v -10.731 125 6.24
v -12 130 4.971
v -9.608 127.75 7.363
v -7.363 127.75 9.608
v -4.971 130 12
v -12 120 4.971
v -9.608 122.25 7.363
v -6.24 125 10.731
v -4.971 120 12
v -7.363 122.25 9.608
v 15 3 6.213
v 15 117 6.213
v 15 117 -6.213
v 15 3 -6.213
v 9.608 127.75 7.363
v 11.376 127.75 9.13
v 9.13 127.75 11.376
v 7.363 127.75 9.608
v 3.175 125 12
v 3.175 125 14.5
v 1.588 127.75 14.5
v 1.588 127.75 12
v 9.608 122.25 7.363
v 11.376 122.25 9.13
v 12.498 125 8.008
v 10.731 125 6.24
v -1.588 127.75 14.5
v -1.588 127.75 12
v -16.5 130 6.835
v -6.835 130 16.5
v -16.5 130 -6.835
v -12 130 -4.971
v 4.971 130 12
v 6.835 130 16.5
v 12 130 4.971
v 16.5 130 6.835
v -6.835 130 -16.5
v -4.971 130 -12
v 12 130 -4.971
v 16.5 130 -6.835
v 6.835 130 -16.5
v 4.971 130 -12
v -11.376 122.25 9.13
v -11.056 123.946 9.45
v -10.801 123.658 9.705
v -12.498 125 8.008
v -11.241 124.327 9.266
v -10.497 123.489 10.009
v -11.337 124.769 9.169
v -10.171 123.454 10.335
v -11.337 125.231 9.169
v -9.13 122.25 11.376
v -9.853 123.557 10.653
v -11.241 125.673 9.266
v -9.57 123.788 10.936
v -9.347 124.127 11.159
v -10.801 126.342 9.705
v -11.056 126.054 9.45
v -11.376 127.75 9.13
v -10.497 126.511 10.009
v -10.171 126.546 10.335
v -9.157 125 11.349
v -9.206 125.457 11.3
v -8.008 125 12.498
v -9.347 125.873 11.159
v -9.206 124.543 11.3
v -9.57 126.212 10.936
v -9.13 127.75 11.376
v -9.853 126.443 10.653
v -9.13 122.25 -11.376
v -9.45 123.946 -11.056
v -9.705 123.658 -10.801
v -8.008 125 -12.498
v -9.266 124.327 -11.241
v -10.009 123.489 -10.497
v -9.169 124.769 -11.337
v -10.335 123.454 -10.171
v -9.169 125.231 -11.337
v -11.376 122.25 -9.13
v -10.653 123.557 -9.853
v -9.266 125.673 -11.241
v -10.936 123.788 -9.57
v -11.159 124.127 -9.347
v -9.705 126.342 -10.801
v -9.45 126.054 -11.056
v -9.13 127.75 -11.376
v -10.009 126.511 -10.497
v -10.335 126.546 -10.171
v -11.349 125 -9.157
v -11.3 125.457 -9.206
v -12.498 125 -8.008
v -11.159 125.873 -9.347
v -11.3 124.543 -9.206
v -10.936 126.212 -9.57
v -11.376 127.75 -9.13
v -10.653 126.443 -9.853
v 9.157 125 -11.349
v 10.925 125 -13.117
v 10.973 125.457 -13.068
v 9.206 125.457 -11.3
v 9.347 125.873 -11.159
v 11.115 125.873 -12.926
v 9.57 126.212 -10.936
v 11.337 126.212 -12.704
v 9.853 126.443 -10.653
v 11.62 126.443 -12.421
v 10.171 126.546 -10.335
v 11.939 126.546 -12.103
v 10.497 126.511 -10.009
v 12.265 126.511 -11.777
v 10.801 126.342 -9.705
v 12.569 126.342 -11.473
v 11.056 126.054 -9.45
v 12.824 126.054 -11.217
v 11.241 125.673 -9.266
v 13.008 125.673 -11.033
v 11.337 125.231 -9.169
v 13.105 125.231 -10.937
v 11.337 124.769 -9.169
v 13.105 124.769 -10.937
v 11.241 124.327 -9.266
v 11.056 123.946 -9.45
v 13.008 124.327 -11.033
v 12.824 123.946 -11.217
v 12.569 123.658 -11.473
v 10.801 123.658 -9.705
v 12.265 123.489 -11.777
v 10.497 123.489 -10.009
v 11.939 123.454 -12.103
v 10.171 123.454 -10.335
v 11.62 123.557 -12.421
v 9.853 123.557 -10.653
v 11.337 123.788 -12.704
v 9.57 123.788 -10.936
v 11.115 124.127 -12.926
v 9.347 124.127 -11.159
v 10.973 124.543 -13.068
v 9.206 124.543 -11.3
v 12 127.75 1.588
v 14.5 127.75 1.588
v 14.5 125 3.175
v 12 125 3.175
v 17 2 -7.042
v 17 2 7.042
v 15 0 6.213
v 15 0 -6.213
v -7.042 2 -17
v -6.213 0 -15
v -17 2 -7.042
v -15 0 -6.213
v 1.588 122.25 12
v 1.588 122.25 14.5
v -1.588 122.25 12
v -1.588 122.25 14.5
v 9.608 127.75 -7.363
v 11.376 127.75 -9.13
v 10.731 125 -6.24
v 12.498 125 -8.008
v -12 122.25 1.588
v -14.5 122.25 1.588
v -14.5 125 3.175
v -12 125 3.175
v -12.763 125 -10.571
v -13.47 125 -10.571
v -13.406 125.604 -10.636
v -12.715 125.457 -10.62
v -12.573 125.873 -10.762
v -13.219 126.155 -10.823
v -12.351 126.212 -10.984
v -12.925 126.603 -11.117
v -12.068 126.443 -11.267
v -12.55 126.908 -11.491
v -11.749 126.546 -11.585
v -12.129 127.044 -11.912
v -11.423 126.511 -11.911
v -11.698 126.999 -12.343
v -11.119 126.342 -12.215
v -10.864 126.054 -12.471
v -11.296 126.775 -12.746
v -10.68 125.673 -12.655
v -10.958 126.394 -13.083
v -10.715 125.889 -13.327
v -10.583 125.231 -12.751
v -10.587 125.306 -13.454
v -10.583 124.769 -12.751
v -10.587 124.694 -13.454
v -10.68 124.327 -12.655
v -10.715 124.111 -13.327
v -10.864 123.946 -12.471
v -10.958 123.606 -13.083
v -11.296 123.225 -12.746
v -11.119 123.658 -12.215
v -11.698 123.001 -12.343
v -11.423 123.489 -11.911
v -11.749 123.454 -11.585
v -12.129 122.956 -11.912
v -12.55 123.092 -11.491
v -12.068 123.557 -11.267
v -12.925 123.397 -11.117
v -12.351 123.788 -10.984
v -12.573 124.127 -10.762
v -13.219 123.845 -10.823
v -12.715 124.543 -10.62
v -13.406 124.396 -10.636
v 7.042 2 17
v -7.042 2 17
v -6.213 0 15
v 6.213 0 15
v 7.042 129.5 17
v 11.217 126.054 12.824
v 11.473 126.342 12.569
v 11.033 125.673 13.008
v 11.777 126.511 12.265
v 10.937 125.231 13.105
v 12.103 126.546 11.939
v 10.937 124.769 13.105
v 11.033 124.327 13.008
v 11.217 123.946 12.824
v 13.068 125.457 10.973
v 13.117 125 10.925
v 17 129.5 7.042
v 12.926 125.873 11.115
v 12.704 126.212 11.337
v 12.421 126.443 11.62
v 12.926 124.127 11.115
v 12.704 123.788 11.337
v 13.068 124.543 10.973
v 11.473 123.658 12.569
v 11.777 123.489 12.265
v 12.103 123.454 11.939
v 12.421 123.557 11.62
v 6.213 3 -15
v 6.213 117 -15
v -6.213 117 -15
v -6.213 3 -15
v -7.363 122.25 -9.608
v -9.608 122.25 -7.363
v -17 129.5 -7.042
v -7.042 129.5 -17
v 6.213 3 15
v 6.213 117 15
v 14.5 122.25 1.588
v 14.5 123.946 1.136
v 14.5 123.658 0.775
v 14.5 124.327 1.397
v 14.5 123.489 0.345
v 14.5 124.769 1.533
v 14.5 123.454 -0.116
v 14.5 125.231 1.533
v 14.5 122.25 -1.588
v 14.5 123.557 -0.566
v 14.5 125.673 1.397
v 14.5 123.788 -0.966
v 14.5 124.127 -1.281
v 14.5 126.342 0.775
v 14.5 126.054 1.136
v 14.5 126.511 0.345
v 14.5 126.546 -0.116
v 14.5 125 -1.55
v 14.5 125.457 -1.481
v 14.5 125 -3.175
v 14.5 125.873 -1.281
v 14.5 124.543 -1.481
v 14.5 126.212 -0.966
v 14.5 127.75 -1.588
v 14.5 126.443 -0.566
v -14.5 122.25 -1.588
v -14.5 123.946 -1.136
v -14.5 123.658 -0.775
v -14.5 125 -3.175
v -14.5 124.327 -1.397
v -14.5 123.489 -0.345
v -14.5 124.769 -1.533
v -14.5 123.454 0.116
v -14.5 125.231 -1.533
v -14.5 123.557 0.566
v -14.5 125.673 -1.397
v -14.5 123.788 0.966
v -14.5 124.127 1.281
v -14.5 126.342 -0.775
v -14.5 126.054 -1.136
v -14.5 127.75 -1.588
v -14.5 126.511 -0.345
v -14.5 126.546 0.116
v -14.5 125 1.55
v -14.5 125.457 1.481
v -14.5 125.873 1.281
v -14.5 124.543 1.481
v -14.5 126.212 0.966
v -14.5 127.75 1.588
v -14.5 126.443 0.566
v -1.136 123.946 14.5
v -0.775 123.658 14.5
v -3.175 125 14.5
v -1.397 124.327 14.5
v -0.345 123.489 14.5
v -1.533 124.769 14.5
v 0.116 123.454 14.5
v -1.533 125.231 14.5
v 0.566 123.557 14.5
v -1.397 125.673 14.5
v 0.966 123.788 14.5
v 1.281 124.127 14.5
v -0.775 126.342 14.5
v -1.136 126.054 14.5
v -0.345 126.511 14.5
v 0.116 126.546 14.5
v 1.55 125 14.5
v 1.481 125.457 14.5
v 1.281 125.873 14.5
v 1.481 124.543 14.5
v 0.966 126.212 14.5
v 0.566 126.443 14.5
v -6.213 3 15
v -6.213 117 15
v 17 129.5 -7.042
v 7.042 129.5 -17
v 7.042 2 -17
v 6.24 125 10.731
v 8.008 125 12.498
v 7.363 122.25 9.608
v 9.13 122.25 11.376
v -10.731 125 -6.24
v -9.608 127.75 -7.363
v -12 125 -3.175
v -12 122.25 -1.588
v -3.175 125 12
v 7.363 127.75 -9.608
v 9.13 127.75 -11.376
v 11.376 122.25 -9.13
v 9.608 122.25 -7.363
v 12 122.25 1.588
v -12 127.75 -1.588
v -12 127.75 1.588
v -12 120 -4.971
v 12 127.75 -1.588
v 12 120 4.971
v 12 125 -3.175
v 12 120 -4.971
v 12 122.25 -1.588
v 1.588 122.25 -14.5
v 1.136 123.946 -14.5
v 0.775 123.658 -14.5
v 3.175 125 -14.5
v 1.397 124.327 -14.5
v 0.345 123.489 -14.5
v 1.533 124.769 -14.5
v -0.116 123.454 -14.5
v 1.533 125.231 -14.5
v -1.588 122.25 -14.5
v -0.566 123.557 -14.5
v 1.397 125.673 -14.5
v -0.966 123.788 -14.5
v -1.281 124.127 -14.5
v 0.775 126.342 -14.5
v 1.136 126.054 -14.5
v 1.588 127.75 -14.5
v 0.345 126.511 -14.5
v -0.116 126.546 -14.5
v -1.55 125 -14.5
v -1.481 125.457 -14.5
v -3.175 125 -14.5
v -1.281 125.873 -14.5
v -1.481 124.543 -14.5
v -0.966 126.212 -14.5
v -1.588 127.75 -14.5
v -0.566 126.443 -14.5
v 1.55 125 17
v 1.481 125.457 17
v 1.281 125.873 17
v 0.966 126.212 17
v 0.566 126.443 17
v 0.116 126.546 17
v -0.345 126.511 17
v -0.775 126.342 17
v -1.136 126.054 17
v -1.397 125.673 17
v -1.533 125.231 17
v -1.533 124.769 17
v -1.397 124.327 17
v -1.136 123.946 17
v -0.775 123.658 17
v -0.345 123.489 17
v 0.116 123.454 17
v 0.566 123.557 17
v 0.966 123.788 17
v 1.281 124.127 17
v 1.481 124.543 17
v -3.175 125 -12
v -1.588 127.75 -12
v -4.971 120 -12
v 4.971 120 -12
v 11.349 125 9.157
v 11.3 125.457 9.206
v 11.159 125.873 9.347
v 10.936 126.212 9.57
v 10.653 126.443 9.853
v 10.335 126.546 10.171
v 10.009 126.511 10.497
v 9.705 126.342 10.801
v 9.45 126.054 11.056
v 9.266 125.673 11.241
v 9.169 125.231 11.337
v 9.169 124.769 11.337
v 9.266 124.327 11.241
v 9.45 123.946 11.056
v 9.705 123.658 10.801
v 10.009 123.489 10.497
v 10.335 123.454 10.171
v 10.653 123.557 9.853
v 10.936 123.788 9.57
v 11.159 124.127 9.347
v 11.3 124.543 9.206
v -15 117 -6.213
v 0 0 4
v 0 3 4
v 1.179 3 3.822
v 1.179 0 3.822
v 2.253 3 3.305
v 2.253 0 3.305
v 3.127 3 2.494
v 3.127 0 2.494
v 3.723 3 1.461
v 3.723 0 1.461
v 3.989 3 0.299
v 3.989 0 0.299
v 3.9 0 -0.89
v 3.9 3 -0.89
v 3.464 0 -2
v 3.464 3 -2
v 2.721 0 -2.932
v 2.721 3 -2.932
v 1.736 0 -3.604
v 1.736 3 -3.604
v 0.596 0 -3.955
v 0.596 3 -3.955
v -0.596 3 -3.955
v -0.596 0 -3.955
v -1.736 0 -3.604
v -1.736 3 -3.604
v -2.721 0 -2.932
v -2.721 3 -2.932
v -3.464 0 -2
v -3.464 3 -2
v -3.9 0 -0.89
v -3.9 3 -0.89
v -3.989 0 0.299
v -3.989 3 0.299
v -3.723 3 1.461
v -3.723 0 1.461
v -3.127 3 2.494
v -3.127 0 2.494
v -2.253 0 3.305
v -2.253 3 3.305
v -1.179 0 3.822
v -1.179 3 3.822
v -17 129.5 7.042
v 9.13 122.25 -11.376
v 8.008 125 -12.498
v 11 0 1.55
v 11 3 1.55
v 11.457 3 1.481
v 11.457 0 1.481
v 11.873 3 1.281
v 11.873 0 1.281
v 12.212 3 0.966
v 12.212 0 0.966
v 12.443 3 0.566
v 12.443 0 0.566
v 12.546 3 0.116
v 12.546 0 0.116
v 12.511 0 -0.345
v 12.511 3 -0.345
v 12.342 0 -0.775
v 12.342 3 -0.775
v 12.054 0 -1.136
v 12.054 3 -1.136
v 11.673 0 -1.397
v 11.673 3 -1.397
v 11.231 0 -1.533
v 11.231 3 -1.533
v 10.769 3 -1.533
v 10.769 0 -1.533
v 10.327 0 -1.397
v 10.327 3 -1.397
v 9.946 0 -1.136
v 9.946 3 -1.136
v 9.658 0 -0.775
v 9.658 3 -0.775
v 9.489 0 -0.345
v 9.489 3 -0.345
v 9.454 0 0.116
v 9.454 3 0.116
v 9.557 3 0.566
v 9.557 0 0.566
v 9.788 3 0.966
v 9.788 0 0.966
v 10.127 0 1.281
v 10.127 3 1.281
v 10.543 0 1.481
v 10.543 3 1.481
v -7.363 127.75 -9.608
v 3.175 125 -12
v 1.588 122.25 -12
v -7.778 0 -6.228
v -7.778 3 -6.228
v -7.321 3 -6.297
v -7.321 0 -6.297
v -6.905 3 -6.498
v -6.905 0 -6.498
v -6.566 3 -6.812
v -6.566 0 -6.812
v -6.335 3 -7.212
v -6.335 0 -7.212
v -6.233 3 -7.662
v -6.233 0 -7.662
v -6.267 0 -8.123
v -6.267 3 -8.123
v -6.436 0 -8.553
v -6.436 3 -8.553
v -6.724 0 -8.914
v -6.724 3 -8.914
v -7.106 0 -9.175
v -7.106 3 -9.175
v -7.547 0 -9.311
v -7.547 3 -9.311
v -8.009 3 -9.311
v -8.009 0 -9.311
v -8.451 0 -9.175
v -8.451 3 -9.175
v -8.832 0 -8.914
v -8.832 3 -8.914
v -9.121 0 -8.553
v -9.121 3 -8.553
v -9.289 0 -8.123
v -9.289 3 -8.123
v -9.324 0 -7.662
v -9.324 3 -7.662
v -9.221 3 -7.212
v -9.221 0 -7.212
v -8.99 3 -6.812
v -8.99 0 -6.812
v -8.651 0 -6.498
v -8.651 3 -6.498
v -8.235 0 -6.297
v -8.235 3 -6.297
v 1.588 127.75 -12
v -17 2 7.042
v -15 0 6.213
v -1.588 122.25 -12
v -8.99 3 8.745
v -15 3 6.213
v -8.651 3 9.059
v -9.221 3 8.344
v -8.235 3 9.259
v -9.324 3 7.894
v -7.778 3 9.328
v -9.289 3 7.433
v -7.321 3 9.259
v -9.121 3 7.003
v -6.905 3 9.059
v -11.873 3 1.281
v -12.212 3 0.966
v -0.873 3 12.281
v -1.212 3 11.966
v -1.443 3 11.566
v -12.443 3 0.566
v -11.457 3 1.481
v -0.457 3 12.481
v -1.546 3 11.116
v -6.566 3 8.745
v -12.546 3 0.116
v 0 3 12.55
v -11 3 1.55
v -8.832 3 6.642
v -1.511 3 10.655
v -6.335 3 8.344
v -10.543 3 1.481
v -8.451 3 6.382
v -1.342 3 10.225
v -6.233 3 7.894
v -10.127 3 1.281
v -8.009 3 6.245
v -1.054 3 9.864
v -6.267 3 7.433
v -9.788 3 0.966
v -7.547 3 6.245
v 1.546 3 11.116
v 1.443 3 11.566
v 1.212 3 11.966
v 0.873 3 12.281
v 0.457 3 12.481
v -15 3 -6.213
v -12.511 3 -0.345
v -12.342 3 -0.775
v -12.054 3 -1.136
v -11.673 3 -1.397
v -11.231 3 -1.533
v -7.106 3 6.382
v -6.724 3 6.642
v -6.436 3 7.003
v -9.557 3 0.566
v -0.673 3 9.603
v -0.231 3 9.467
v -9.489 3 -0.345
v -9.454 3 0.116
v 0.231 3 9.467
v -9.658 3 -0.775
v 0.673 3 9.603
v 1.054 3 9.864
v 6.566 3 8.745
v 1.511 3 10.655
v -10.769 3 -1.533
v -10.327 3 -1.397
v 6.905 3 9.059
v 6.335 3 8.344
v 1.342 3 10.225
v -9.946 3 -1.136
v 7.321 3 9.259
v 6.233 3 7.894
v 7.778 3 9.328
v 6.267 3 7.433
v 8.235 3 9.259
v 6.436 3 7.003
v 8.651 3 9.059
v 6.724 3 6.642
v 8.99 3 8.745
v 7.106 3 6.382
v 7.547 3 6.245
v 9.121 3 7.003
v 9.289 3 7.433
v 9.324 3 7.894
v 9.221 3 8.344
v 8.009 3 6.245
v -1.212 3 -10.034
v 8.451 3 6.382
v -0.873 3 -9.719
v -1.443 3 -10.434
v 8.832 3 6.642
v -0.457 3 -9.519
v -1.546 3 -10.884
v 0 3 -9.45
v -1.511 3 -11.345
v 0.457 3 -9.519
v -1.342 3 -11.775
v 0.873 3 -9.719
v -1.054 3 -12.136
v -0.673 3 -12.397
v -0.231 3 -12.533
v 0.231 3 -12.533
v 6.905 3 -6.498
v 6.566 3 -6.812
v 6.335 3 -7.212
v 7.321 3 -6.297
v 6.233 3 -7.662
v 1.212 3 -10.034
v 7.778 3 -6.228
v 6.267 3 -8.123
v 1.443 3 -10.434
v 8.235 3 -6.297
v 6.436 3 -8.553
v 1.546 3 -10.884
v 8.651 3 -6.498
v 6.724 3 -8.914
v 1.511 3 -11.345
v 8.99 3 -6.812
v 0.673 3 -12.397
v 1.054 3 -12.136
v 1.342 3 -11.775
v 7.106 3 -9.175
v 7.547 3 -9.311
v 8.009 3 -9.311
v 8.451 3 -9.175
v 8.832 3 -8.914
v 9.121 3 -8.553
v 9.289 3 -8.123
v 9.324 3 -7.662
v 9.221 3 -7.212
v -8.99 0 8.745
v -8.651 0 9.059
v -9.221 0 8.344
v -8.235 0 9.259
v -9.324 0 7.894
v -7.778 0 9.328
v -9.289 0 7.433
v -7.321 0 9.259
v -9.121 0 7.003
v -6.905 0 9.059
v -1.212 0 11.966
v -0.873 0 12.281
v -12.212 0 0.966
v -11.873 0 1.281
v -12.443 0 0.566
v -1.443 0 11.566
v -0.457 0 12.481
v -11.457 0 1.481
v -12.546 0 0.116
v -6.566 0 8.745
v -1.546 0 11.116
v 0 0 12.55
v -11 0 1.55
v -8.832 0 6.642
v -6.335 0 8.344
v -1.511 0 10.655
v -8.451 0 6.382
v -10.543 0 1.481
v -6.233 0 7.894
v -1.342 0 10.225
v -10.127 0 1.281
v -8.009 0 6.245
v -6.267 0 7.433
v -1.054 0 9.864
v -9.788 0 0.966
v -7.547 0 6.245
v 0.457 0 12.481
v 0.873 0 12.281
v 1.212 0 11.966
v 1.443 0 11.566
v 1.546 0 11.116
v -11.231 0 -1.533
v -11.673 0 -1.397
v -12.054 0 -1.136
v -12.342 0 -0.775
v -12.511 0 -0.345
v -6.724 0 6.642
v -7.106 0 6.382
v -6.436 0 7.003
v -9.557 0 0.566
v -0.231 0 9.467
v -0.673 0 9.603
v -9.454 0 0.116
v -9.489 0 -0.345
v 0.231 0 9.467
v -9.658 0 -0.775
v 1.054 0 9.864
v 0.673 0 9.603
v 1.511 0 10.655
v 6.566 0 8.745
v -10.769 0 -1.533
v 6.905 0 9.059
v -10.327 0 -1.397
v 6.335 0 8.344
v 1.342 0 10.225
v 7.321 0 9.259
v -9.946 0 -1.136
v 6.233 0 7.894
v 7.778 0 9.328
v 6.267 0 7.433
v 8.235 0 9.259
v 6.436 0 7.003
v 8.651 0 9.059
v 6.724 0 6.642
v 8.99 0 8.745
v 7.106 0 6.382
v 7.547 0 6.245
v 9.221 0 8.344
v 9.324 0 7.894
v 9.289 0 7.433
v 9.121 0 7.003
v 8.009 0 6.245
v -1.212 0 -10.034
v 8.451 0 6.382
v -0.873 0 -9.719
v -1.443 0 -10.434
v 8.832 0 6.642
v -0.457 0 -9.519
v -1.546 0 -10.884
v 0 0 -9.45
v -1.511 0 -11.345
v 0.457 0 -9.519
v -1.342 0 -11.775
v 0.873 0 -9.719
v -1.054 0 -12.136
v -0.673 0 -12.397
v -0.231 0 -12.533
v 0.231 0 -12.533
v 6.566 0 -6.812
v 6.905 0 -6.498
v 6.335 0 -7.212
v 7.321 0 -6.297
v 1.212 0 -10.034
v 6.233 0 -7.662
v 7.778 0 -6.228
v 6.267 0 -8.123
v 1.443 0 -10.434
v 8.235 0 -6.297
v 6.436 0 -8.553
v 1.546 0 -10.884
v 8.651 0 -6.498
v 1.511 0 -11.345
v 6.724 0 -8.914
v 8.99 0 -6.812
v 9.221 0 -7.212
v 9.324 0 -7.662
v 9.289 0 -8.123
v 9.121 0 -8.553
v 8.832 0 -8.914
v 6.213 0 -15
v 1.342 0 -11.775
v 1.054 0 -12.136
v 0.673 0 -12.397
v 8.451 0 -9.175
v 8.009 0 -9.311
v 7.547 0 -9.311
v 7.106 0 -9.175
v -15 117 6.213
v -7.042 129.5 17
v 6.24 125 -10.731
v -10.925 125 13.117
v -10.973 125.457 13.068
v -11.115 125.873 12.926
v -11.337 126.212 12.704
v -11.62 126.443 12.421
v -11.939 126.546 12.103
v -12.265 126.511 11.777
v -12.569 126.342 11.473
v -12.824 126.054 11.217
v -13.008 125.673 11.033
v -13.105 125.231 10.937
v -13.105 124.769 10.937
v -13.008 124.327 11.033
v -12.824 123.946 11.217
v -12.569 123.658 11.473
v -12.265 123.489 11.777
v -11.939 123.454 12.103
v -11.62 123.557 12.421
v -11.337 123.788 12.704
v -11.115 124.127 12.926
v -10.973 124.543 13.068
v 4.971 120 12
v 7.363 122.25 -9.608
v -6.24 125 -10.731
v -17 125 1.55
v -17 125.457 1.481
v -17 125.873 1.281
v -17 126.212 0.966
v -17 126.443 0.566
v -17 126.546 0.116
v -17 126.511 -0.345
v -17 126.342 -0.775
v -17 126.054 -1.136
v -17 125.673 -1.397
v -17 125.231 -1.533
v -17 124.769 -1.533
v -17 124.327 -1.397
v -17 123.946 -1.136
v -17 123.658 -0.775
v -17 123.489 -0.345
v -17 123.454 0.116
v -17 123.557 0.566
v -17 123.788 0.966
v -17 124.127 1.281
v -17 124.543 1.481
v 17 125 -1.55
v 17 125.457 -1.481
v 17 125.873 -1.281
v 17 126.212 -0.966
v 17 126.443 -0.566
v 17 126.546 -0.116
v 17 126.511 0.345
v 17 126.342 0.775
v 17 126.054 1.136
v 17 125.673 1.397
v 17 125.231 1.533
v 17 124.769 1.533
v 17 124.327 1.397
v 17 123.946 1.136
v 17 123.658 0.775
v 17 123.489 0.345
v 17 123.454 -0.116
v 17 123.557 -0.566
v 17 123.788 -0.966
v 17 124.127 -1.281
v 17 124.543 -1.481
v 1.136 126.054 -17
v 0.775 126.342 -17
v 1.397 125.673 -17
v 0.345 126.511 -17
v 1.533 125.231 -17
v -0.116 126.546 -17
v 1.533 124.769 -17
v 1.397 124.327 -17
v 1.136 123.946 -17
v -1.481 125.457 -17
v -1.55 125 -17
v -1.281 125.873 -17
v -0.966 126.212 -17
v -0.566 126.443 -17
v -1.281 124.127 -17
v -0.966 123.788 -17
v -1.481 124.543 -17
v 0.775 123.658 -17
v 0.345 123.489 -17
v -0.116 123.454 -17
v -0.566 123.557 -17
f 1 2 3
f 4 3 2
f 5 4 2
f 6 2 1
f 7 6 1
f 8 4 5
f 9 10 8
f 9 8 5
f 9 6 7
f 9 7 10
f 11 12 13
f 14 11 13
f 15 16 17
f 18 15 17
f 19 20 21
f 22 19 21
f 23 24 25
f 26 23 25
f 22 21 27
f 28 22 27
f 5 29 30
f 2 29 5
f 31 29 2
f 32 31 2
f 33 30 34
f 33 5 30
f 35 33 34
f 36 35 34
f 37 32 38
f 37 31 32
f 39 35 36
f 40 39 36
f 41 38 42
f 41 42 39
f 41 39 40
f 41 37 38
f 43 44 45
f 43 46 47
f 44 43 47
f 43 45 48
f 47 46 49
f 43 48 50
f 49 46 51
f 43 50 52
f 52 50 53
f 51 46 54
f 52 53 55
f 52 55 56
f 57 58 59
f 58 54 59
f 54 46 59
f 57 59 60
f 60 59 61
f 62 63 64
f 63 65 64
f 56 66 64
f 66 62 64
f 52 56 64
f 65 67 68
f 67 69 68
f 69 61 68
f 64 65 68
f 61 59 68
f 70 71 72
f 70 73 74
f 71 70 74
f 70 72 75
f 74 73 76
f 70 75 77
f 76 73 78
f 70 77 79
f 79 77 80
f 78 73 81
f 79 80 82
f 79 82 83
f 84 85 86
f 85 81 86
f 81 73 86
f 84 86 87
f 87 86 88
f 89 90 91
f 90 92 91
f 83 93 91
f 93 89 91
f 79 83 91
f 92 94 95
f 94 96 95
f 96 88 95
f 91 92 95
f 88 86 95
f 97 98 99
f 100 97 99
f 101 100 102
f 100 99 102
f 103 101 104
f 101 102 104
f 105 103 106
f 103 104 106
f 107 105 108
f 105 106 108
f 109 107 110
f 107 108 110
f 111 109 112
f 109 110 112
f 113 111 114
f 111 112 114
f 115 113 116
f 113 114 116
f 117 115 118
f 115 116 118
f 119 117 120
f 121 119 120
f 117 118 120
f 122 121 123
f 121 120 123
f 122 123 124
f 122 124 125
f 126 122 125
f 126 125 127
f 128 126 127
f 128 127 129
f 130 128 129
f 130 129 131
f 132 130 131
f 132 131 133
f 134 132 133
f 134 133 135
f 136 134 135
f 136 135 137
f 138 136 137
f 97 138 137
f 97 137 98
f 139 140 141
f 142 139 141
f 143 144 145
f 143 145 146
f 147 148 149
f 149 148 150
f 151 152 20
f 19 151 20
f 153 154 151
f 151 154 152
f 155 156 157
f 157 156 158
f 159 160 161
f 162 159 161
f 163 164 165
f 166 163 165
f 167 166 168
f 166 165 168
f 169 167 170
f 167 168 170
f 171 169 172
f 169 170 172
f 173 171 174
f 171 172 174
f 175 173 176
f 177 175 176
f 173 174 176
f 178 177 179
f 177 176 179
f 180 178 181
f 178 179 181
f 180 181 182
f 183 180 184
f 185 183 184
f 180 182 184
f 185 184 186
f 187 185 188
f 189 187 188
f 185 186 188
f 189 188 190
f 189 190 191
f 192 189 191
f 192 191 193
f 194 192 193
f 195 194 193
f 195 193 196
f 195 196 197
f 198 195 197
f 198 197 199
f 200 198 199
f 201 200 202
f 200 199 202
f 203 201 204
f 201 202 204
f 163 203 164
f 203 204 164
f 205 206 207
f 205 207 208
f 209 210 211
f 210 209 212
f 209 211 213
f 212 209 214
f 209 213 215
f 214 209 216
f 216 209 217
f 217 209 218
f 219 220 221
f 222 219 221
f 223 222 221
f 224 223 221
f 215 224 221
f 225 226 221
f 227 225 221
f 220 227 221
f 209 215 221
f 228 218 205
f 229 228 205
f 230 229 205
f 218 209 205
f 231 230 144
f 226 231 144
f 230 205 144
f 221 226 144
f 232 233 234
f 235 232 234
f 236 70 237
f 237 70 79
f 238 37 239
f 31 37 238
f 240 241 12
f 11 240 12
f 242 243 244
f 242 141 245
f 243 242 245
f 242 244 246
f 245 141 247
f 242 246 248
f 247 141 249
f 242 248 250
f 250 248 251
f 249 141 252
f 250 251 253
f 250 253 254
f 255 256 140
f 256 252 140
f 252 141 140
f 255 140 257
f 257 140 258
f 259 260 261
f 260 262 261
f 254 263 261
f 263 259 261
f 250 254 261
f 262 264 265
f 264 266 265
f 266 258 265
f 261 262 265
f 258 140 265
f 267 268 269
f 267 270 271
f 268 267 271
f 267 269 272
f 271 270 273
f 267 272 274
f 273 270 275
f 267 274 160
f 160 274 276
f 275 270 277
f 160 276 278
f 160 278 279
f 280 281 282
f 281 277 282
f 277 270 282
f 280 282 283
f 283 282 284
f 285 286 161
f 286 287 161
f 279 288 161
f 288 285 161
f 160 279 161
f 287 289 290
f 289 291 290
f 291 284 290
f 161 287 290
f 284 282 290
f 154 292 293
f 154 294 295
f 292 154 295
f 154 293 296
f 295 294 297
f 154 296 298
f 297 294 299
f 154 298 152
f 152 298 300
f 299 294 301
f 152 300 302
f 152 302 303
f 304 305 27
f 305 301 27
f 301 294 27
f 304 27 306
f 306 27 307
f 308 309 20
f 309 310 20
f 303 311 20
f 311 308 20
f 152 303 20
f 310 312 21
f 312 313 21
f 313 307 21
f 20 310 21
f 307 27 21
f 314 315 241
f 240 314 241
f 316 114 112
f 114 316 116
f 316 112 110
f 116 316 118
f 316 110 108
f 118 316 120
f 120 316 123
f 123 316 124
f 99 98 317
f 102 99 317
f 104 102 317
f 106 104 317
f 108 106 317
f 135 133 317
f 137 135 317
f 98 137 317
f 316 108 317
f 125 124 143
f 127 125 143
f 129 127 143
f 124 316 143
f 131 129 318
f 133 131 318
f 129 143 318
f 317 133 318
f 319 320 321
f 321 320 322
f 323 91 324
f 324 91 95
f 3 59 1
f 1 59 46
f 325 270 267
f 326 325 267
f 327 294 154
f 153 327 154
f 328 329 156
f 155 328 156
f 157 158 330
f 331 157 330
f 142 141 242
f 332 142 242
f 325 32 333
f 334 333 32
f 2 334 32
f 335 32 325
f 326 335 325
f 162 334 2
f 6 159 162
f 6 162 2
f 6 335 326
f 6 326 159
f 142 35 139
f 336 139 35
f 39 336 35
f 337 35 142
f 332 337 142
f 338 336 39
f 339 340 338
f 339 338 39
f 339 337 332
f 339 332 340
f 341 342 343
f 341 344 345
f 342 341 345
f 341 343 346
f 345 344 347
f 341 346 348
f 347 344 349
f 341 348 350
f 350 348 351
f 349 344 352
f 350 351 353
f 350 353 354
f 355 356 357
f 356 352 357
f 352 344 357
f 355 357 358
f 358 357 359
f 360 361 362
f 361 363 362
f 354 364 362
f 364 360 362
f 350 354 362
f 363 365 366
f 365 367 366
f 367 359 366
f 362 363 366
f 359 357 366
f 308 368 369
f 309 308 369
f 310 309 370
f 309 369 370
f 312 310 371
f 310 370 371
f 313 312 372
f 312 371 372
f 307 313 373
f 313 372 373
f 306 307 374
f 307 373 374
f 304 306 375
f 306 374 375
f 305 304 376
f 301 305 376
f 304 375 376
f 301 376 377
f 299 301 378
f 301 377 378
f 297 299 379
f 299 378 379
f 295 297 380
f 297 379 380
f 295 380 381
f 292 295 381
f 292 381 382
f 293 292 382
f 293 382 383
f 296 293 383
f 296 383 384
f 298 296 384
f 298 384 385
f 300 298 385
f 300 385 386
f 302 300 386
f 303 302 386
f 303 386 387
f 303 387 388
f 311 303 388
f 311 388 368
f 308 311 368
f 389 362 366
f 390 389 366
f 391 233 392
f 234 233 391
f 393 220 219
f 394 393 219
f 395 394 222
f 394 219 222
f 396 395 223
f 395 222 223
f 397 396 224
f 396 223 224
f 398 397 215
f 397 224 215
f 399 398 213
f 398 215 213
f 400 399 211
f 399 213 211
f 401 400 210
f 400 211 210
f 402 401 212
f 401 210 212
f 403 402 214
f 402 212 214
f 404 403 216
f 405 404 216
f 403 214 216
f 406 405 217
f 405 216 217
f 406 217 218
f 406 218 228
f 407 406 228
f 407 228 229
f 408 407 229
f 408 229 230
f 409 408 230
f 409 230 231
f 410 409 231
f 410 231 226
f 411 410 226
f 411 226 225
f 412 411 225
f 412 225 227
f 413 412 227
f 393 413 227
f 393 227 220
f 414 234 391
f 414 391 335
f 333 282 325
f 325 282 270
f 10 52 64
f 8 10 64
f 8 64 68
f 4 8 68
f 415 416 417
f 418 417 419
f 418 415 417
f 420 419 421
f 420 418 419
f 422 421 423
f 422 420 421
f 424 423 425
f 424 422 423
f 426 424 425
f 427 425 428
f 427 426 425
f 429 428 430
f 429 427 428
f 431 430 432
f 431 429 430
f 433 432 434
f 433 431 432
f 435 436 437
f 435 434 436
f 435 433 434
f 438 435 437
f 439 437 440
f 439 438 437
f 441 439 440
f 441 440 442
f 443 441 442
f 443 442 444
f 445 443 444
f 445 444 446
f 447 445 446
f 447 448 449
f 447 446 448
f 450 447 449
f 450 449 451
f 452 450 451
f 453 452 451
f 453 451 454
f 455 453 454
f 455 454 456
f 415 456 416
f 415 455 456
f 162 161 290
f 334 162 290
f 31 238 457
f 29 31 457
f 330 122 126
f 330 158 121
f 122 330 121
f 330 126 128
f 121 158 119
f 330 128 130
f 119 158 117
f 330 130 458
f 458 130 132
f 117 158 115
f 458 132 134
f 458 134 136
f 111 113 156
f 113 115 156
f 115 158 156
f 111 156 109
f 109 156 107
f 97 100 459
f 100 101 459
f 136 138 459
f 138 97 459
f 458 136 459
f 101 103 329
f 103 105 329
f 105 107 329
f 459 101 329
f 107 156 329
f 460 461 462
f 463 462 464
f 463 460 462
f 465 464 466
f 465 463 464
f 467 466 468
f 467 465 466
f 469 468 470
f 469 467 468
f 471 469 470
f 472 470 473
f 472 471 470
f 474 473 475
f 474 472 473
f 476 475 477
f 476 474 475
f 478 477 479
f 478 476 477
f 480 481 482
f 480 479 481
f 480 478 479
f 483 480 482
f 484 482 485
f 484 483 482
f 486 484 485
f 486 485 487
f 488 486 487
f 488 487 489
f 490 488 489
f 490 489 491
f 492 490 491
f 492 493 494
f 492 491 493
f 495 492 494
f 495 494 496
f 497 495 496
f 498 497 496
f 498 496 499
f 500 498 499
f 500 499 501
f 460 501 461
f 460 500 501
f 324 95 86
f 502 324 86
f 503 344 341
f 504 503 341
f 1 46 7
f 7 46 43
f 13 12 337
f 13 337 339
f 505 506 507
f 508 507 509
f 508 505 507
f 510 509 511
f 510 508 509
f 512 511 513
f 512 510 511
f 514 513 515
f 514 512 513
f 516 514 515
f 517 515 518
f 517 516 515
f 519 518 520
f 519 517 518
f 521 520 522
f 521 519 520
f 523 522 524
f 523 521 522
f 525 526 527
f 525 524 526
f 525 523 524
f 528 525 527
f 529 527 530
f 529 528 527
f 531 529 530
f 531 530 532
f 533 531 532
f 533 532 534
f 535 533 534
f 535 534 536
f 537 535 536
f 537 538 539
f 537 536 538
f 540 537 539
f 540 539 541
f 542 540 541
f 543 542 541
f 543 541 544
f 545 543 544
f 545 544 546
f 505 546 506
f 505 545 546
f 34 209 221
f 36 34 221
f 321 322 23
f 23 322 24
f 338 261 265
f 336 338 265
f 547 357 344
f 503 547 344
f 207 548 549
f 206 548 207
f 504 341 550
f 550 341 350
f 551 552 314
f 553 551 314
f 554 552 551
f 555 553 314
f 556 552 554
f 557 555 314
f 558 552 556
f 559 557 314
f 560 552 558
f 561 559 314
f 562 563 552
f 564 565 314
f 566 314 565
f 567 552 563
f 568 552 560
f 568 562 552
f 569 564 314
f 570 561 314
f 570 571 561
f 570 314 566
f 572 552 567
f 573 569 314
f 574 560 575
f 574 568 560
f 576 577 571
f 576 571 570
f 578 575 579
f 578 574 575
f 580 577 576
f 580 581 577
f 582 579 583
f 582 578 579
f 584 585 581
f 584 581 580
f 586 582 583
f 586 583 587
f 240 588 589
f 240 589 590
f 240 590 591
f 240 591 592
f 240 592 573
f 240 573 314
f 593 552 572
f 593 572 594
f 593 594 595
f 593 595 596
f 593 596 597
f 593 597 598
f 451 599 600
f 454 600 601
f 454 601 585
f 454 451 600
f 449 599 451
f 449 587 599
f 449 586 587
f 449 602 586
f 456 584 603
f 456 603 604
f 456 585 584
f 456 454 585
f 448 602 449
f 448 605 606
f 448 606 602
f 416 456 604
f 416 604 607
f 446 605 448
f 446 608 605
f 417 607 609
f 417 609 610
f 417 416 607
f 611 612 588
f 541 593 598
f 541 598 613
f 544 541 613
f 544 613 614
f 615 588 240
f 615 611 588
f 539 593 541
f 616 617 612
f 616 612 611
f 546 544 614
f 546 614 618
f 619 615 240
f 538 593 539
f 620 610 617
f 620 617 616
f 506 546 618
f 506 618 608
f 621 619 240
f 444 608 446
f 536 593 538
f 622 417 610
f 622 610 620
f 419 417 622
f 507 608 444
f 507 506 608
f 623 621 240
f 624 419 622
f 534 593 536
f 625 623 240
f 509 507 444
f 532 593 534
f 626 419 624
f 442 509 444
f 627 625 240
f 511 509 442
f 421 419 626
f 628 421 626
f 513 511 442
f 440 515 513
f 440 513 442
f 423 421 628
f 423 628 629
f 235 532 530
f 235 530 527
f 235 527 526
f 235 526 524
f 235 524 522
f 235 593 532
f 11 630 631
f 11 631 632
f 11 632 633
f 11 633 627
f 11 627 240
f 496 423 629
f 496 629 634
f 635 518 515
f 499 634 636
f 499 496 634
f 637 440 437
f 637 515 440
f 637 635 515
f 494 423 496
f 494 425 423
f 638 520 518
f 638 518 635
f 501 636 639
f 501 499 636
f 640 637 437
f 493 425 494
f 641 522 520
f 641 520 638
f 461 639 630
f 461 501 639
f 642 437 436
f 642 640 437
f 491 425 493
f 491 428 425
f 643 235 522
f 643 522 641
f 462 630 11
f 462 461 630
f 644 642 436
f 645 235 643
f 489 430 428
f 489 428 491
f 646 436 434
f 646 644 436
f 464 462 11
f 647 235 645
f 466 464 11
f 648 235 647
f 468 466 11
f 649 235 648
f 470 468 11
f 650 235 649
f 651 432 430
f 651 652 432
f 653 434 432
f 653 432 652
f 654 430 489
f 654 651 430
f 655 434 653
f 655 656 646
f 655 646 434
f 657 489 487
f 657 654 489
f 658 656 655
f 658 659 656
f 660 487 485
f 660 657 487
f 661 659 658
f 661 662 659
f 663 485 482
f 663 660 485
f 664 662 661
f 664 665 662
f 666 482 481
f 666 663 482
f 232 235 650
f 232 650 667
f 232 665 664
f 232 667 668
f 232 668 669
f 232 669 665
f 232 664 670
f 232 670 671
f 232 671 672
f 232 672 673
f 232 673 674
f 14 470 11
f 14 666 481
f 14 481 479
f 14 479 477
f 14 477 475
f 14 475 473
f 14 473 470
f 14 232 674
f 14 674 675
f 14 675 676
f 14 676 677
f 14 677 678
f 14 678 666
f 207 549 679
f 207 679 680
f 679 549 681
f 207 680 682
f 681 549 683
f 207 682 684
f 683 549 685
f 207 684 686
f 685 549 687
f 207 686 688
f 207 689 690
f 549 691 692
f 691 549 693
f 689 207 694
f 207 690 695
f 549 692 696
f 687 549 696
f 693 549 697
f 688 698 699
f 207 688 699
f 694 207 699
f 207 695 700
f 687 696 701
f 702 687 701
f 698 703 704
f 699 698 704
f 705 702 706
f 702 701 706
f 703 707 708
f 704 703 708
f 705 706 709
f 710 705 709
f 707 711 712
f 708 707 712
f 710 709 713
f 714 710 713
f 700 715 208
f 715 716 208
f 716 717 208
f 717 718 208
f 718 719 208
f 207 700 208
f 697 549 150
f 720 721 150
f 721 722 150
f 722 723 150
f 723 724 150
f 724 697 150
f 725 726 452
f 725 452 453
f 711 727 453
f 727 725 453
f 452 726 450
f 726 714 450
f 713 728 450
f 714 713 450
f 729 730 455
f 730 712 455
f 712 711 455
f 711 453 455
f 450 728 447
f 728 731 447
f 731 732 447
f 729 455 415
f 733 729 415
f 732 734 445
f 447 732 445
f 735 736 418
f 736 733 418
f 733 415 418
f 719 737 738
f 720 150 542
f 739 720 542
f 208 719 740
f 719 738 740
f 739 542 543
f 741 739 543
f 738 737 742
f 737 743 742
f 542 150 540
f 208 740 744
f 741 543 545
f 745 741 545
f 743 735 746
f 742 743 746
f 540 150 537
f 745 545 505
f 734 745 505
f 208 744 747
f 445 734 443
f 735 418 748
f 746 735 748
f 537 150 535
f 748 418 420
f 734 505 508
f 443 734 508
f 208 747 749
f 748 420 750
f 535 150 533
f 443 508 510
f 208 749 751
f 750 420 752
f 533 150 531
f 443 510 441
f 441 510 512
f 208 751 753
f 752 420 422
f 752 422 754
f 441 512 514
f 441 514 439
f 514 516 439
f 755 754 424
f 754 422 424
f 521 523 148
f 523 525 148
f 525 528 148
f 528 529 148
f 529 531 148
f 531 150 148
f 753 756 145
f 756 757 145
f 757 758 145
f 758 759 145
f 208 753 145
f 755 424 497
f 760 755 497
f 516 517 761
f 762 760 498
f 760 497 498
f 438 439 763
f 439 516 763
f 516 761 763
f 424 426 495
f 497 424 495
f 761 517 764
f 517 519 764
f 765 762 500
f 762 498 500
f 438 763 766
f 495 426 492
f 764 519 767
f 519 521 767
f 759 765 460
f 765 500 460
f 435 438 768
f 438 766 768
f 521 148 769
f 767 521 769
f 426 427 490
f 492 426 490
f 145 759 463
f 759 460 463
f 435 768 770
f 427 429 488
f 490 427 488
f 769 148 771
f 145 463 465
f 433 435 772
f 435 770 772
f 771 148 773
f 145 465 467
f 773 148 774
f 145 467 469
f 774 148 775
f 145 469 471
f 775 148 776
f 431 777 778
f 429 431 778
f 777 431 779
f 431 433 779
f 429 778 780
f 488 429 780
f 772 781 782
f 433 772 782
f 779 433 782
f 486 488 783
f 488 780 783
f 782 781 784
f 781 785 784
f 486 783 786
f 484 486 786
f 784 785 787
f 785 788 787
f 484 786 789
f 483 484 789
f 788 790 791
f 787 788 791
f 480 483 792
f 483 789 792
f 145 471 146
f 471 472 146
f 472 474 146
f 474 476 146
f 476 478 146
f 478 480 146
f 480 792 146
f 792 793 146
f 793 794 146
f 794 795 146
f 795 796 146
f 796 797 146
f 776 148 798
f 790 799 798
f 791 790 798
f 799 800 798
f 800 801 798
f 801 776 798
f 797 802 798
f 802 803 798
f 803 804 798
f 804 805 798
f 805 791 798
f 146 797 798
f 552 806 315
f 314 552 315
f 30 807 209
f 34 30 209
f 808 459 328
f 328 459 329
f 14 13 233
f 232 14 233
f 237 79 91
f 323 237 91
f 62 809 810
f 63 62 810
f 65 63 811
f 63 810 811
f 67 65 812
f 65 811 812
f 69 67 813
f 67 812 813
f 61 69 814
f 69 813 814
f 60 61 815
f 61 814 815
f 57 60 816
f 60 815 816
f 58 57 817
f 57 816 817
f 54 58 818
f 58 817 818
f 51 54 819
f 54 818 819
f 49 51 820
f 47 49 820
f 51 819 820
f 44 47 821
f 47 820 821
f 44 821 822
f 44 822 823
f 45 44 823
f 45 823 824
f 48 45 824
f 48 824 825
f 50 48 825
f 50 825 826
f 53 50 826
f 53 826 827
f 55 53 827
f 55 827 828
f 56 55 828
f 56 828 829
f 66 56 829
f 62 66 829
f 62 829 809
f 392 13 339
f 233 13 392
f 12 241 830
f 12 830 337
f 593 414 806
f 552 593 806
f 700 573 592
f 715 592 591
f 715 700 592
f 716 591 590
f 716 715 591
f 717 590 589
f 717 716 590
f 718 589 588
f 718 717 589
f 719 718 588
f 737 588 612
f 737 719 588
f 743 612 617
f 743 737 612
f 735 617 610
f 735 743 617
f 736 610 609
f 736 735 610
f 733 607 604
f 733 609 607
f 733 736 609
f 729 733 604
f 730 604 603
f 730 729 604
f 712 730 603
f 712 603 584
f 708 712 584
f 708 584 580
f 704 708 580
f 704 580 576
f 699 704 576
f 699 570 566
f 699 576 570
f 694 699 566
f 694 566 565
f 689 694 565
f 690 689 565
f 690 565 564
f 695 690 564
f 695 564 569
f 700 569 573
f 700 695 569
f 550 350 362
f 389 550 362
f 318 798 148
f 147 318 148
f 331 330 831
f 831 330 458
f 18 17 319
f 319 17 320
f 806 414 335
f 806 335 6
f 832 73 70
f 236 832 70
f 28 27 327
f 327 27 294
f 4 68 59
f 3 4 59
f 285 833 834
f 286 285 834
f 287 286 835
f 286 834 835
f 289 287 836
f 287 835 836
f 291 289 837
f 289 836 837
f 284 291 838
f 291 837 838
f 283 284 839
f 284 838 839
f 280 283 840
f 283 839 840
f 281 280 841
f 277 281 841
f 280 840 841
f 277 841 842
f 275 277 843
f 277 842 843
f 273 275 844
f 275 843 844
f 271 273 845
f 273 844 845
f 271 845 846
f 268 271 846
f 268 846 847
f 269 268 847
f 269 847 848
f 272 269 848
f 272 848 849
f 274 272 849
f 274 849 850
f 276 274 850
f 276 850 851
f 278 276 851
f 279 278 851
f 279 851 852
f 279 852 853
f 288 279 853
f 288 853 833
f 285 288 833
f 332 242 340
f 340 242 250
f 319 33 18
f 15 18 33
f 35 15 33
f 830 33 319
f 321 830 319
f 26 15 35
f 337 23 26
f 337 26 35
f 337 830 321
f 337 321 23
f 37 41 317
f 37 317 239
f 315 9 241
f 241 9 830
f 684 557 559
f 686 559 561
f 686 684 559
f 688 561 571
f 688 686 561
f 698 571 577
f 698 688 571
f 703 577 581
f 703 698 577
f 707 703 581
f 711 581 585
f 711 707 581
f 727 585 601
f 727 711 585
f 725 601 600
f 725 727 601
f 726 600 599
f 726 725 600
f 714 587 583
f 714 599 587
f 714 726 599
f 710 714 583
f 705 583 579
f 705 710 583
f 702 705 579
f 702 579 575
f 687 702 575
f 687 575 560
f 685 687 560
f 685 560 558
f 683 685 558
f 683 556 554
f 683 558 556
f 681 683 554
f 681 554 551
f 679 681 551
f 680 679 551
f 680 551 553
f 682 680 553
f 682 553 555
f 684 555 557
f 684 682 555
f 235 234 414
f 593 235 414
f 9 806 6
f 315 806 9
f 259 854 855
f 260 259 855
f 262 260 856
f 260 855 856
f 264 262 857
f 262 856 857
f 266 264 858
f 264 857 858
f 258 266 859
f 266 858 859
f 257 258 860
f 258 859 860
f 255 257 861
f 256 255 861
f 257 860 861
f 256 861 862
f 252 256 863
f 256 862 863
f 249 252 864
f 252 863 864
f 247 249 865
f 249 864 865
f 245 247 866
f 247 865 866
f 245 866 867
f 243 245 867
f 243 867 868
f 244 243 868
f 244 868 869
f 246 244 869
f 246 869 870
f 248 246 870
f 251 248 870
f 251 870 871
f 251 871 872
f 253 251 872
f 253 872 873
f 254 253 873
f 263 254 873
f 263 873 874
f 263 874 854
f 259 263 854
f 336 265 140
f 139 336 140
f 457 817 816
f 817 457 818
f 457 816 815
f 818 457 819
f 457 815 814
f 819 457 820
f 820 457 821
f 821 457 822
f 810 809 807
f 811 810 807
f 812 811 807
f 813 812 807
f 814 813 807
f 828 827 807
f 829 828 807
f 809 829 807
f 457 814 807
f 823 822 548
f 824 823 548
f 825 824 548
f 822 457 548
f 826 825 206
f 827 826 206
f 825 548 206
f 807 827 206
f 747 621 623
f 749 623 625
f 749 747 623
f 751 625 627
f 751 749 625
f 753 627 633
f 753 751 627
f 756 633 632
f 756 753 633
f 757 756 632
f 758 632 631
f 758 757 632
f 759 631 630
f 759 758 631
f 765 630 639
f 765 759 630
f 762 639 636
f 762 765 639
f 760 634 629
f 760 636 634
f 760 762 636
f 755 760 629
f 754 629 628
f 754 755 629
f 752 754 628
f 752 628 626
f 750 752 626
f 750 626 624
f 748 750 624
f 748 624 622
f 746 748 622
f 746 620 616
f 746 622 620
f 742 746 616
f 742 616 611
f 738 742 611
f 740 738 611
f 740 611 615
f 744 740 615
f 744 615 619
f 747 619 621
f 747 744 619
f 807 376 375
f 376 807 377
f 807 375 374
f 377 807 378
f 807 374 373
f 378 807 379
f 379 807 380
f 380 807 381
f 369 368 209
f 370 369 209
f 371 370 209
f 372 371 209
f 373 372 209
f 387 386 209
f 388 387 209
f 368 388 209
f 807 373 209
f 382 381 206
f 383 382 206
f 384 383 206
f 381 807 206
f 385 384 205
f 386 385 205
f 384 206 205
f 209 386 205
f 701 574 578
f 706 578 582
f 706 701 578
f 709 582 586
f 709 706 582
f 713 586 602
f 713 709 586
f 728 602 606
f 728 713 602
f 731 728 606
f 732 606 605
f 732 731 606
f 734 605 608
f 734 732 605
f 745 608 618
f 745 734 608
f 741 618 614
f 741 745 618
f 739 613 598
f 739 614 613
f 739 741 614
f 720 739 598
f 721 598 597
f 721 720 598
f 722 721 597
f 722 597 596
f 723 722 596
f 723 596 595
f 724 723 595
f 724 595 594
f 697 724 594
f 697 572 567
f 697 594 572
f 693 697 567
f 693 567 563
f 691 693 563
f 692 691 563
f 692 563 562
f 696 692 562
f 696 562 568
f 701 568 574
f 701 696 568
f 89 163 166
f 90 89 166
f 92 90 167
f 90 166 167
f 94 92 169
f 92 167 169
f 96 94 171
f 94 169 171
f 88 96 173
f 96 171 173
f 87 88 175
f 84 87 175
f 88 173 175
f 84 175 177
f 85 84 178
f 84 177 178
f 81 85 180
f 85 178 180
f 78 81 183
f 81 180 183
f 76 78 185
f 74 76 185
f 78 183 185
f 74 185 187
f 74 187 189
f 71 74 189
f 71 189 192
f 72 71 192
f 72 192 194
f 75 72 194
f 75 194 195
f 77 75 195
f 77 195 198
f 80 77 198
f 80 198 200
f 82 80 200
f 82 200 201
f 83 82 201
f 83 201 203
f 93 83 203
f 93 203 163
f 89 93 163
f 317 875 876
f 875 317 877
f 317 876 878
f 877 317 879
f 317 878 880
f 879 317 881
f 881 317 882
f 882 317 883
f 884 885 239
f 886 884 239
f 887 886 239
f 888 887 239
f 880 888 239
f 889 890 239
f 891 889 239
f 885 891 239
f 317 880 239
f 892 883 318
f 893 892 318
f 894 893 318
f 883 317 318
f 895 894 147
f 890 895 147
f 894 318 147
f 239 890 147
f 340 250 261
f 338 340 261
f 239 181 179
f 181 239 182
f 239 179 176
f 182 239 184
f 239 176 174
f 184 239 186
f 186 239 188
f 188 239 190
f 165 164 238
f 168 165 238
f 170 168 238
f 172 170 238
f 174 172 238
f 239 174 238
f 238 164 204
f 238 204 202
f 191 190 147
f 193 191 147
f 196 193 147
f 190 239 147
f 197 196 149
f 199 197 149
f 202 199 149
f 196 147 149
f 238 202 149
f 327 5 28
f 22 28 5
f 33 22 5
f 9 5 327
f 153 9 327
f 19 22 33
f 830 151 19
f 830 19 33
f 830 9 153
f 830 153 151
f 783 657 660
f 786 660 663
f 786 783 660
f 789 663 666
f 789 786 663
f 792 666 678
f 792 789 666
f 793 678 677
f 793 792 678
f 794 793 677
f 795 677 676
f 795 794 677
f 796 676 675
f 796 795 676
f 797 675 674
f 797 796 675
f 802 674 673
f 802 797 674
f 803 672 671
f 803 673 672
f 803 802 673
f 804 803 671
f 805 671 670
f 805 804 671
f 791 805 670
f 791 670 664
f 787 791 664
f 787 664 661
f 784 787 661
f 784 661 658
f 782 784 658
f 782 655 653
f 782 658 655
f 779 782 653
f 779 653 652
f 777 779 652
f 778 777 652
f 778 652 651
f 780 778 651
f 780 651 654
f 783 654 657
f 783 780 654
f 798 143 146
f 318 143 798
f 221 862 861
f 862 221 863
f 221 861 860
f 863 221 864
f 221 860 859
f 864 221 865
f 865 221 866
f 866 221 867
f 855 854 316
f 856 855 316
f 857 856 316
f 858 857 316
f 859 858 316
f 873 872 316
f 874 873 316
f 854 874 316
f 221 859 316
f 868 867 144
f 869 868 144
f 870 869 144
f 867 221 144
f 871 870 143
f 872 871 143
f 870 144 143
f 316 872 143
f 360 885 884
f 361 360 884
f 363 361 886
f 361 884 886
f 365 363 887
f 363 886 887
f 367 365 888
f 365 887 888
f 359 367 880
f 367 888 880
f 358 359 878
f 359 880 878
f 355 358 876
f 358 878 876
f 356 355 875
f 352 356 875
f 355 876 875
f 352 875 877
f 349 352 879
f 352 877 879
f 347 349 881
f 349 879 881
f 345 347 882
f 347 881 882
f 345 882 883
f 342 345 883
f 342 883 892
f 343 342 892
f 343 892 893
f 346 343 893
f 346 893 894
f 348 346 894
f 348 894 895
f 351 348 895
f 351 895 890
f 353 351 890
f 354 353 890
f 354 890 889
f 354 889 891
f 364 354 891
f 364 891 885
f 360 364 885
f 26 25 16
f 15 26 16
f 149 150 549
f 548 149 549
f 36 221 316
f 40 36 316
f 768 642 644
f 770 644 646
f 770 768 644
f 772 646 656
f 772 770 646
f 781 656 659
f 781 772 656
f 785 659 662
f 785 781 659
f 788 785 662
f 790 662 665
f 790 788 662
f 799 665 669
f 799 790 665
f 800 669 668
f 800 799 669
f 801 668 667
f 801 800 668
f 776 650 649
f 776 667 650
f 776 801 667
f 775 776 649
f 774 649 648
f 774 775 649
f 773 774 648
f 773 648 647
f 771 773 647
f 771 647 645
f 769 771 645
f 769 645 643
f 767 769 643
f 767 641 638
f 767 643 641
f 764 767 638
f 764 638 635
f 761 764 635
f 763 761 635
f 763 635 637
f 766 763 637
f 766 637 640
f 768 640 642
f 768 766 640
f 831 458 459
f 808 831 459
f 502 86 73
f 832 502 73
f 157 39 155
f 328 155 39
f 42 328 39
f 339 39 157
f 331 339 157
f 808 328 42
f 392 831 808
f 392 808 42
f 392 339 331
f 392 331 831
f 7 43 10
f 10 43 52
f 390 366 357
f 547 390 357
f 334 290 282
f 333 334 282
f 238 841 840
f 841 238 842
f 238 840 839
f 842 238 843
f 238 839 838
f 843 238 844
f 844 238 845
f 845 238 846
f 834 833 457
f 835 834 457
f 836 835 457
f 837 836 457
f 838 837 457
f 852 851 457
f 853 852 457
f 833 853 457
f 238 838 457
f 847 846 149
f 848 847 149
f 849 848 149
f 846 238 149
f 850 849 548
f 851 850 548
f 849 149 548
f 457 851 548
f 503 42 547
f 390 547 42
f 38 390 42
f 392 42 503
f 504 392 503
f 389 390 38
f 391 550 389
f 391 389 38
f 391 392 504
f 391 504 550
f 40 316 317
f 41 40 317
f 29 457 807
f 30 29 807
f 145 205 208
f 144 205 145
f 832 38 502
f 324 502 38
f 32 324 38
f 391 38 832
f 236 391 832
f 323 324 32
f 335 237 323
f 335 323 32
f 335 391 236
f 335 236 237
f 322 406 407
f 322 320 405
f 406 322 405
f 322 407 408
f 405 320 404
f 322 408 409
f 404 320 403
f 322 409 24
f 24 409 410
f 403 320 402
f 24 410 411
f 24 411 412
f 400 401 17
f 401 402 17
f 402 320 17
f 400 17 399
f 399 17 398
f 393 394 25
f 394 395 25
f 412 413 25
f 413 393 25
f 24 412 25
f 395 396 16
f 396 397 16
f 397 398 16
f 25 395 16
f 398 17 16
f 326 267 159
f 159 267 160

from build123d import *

# Parameters (mm, degrees)
CROQUIS1_R              = 1.55
CROQUIS1_R_2            = 4
SALIENTE_EXTRUIR1_DEPTH = 120
CORTAR_EXTRUIR1_DEPTH   = 117
SALIENTE_EXTRUIR2_DEPTH = 10
CHAFL_N2_SIZE           = 3
CORTAR_EXTRUIR2_REACH   = 138.325
CROQUIS4_R              = 1.55
CHAFL_N3_SIZE           = 0.5
CORTAR_EXTRUIR3_START   = -2.5
CORTAR_EXTRUIR3_DEPTH   = 10
MATRIZC5_COUNT          = 8
CHAFL_N1_SIZE           = 2
CHAFL_N4_SIZE           = 0.5


with BuildPart() as part:
    # Croquis1 → Saliente-Extruir1 (new body)
    with BuildSketch(Plane(origin=(0, 0, 0), x_dir=(1, 0, 0), z_dir=(0, 1, 0))):
        Polygon((17, -7.04163056), (17, 7.04163056), (7.04163056, 17), (-7.04163056, 17), (-17, 7.04163056), (-17, -7.04163056), (-7.04163056, -17), (7.04163056, -17), align=None)
        with Locations(Location((0, 11, 0), (0, 0, 270))):
            Circle(CROQUIS1_R, mode=Mode.SUBTRACT)
        with Locations(Location((0, 0, 0), (0, 0, 270))):
            Circle(CROQUIS1_R_2, mode=Mode.SUBTRACT)
        with Locations(Location((7.778174593, 7.778174593, 0), (0, 0, 270))):
            Circle(CROQUIS1_R, mode=Mode.SUBTRACT)
        with Locations(Location((11, 0, 0), (0, 0, 270))):
            Circle(CROQUIS1_R, mode=Mode.SUBTRACT)
        with Locations(Location((7.778174593, -7.778174593, 0), (0, 0, 270))):
            Circle(CROQUIS1_R, mode=Mode.SUBTRACT)
        with Locations(Location((0, -11, 0), (0, 0, 270))):
            Circle(CROQUIS1_R, mode=Mode.SUBTRACT)
        with Locations(Location((-7.778174593, -7.778174593, 0), (0, 0, 270))):
            Circle(CROQUIS1_R, mode=Mode.SUBTRACT)
        with Locations(Location((-11, 0, 0), (0, 0, 270))):
            Circle(CROQUIS1_R, mode=Mode.SUBTRACT)
        with Locations(Location((-7.778174593, 7.778174593, 0), (0, 0, 270))):
            Circle(CROQUIS1_R, mode=Mode.SUBTRACT)
    extrude(amount=SALIENTE_EXTRUIR1_DEPTH)

    # Croquis2 → Cortar-Extruir1 (cut)
    with BuildSketch(Plane(origin=(0, 120, 0), x_dir=(1, 0, 0), z_dir=(0, 1, 0))):
        Polygon((6.213203436, 15), (-6.213203436, 15), (-15, 6.213203436), (-15, -6.213203436), (-6.213203436, -15), (6.213203436, -15), (15, -6.213203436), (15, 6.213203436), align=None)
    extrude(amount=-CORTAR_EXTRUIR1_DEPTH, mode=Mode.SUBTRACT)

    # Croquis3 → Saliente-Extruir2 (add)
    with BuildSketch(Plane(origin=(0, 120, 0), x_dir=(1, 0, 0), z_dir=(0, 1, 0))):
        Polygon((7.04163056, 17), (-7.04163056, 17), (-17, 7.04163056), (-17, -7.04163056), (-7.04163056, -17), (7.04163056, -17), (17, -7.04163056), (17, 7.04163056), align=None)
        Polygon((12, -4.970562748), (12, 4.970562748), (4.970562748, 12), (-4.970562748, 12), (-12, 4.970562748), (-12, -4.970562748), (-4.970562748, -12), (4.970562748, -12), align=None, mode=Mode.SUBTRACT)
    extrude(amount=SALIENTE_EXTRUIR2_DEPTH)

    # Chaflán2
    chafl_n2_edges = [part.edges().sort_by_distance(p)[0] for p in [
        (10.606601718, 120, -10.606601718),
        (0, 120, -15),
        (-10.606601718, 120, -10.606601718),
        (-15, 120, 0),
        (-10.606601718, 120, 10.606601718),
        (0, 120, 15),
        (10.606601718, 120, 10.606601718),
        (15, 120, 0),
    ]]
    chamfer(chafl_n2_edges, length=CHAFL_N2_SIZE - 0.0001)  # a hair under: the kernel refuses the full size

    # Croquis4 → Cortar-Extruir2 (cut, up to next)
    with BuildSketch(Plane(origin=(-12.02081528, 0, -12.02081528), x_dir=(-0.7071067811865472, 0, 0.7071067811865478), z_dir=(-0.7071067811865478, 0, -0.7071067811865472)), mode=Mode.PRIVATE) as cortar_extruir2_sk1:
        with Locations((0, 125)):
            Circle(CROQUIS4_R)
    cortar_extruir2_tool1 = extrude(cortar_extruir2_sk1.sketch, amount=-CORTAR_EXTRUIR2_REACH, mode=Mode.PRIVATE) & part.part
    cortar_extruir2 = cortar_extruir2_tool1.solids().sort_by_distance((-12.020815, 125, -12.020815))[0]
    add(cortar_extruir2, mode=Mode.SUBTRACT)

    # Chaflán3
    chafl_n3_edges = [part.edges().sort_by_distance(p)[0] for p in [
        (-10.924799769, 125, -13.116830791),
    ]]
    chamfer(chafl_n3_edges, length=CHAFL_N3_SIZE)

    # Croquis5 → Cortar-Extruir3 (cut)
    with BuildSketch(Plane(origin=(-12.02081528, 0, -12.02081528), x_dir=(-0.7071067811865471, 0, 0.7071067811865479), z_dir=(-0.7071067811865479, 0, -0.7071067811865471)).offset(CORTAR_EXTRUIR3_START)):
        Polygon((3.175426481, 125), (1.58771324, 127.75), (-1.58771324, 127.75), (-3.175426481, 125), (-1.58771324, 122.25), (1.58771324, 122.25), align=None)
    cortar_extruir3 = extrude(amount=-CORTAR_EXTRUIR3_DEPTH, mode=Mode.SUBTRACT)

    # MatrizC5: Cortar-Extruir2, Cortar-Extruir3 ×8 about axis
    matrizc5_axis = Axis((0, 0, 0), (0, 1, 0))
    add([cortar_extruir2.rotate(matrizc5_axis, i * 360 / MATRIZC5_COUNT) for i in range(1, MATRIZC5_COUNT)], mode=Mode.SUBTRACT)
    add([cortar_extruir3.rotate(matrizc5_axis, i * 360 / MATRIZC5_COUNT) for i in range(1, MATRIZC5_COUNT)], mode=Mode.SUBTRACT)

    # Chaflán1
    chafl_n1_edges = [part.edges().sort_by_distance(p)[0] for p in [
        (17, 0, 0),
        (12.02081528, 0, 12.02081528),
        (0, 0, 17),
        (-12.02081528, 0, 12.02081528),
        (-17, 0, 0),
        (-12.02081528, 0, -12.02081528),
        (0, 0, -17),
        (12.02081528, 0, -12.02081528),
    ]]
    chamfer(chafl_n1_edges, length=CHAFL_N1_SIZE)

    # Chaflán4
    chafl_n4_edges = [part.edges().sort_by_distance(p)[0] for p in [
        (12.02081528, 130, -12.02081528),
        (0, 130, -17),
        (-12.02081528, 130, -12.02081528),
        (-17, 130, 0),
        (-12.02081528, 130, 12.02081528),
        (0, 130, 17),
        (12.02081528, 130, 12.02081528),
        (17, 130, 0),
    ]]
    chamfer(chafl_n4_edges, length=CHAFL_N4_SIZE)


solid = part.part
